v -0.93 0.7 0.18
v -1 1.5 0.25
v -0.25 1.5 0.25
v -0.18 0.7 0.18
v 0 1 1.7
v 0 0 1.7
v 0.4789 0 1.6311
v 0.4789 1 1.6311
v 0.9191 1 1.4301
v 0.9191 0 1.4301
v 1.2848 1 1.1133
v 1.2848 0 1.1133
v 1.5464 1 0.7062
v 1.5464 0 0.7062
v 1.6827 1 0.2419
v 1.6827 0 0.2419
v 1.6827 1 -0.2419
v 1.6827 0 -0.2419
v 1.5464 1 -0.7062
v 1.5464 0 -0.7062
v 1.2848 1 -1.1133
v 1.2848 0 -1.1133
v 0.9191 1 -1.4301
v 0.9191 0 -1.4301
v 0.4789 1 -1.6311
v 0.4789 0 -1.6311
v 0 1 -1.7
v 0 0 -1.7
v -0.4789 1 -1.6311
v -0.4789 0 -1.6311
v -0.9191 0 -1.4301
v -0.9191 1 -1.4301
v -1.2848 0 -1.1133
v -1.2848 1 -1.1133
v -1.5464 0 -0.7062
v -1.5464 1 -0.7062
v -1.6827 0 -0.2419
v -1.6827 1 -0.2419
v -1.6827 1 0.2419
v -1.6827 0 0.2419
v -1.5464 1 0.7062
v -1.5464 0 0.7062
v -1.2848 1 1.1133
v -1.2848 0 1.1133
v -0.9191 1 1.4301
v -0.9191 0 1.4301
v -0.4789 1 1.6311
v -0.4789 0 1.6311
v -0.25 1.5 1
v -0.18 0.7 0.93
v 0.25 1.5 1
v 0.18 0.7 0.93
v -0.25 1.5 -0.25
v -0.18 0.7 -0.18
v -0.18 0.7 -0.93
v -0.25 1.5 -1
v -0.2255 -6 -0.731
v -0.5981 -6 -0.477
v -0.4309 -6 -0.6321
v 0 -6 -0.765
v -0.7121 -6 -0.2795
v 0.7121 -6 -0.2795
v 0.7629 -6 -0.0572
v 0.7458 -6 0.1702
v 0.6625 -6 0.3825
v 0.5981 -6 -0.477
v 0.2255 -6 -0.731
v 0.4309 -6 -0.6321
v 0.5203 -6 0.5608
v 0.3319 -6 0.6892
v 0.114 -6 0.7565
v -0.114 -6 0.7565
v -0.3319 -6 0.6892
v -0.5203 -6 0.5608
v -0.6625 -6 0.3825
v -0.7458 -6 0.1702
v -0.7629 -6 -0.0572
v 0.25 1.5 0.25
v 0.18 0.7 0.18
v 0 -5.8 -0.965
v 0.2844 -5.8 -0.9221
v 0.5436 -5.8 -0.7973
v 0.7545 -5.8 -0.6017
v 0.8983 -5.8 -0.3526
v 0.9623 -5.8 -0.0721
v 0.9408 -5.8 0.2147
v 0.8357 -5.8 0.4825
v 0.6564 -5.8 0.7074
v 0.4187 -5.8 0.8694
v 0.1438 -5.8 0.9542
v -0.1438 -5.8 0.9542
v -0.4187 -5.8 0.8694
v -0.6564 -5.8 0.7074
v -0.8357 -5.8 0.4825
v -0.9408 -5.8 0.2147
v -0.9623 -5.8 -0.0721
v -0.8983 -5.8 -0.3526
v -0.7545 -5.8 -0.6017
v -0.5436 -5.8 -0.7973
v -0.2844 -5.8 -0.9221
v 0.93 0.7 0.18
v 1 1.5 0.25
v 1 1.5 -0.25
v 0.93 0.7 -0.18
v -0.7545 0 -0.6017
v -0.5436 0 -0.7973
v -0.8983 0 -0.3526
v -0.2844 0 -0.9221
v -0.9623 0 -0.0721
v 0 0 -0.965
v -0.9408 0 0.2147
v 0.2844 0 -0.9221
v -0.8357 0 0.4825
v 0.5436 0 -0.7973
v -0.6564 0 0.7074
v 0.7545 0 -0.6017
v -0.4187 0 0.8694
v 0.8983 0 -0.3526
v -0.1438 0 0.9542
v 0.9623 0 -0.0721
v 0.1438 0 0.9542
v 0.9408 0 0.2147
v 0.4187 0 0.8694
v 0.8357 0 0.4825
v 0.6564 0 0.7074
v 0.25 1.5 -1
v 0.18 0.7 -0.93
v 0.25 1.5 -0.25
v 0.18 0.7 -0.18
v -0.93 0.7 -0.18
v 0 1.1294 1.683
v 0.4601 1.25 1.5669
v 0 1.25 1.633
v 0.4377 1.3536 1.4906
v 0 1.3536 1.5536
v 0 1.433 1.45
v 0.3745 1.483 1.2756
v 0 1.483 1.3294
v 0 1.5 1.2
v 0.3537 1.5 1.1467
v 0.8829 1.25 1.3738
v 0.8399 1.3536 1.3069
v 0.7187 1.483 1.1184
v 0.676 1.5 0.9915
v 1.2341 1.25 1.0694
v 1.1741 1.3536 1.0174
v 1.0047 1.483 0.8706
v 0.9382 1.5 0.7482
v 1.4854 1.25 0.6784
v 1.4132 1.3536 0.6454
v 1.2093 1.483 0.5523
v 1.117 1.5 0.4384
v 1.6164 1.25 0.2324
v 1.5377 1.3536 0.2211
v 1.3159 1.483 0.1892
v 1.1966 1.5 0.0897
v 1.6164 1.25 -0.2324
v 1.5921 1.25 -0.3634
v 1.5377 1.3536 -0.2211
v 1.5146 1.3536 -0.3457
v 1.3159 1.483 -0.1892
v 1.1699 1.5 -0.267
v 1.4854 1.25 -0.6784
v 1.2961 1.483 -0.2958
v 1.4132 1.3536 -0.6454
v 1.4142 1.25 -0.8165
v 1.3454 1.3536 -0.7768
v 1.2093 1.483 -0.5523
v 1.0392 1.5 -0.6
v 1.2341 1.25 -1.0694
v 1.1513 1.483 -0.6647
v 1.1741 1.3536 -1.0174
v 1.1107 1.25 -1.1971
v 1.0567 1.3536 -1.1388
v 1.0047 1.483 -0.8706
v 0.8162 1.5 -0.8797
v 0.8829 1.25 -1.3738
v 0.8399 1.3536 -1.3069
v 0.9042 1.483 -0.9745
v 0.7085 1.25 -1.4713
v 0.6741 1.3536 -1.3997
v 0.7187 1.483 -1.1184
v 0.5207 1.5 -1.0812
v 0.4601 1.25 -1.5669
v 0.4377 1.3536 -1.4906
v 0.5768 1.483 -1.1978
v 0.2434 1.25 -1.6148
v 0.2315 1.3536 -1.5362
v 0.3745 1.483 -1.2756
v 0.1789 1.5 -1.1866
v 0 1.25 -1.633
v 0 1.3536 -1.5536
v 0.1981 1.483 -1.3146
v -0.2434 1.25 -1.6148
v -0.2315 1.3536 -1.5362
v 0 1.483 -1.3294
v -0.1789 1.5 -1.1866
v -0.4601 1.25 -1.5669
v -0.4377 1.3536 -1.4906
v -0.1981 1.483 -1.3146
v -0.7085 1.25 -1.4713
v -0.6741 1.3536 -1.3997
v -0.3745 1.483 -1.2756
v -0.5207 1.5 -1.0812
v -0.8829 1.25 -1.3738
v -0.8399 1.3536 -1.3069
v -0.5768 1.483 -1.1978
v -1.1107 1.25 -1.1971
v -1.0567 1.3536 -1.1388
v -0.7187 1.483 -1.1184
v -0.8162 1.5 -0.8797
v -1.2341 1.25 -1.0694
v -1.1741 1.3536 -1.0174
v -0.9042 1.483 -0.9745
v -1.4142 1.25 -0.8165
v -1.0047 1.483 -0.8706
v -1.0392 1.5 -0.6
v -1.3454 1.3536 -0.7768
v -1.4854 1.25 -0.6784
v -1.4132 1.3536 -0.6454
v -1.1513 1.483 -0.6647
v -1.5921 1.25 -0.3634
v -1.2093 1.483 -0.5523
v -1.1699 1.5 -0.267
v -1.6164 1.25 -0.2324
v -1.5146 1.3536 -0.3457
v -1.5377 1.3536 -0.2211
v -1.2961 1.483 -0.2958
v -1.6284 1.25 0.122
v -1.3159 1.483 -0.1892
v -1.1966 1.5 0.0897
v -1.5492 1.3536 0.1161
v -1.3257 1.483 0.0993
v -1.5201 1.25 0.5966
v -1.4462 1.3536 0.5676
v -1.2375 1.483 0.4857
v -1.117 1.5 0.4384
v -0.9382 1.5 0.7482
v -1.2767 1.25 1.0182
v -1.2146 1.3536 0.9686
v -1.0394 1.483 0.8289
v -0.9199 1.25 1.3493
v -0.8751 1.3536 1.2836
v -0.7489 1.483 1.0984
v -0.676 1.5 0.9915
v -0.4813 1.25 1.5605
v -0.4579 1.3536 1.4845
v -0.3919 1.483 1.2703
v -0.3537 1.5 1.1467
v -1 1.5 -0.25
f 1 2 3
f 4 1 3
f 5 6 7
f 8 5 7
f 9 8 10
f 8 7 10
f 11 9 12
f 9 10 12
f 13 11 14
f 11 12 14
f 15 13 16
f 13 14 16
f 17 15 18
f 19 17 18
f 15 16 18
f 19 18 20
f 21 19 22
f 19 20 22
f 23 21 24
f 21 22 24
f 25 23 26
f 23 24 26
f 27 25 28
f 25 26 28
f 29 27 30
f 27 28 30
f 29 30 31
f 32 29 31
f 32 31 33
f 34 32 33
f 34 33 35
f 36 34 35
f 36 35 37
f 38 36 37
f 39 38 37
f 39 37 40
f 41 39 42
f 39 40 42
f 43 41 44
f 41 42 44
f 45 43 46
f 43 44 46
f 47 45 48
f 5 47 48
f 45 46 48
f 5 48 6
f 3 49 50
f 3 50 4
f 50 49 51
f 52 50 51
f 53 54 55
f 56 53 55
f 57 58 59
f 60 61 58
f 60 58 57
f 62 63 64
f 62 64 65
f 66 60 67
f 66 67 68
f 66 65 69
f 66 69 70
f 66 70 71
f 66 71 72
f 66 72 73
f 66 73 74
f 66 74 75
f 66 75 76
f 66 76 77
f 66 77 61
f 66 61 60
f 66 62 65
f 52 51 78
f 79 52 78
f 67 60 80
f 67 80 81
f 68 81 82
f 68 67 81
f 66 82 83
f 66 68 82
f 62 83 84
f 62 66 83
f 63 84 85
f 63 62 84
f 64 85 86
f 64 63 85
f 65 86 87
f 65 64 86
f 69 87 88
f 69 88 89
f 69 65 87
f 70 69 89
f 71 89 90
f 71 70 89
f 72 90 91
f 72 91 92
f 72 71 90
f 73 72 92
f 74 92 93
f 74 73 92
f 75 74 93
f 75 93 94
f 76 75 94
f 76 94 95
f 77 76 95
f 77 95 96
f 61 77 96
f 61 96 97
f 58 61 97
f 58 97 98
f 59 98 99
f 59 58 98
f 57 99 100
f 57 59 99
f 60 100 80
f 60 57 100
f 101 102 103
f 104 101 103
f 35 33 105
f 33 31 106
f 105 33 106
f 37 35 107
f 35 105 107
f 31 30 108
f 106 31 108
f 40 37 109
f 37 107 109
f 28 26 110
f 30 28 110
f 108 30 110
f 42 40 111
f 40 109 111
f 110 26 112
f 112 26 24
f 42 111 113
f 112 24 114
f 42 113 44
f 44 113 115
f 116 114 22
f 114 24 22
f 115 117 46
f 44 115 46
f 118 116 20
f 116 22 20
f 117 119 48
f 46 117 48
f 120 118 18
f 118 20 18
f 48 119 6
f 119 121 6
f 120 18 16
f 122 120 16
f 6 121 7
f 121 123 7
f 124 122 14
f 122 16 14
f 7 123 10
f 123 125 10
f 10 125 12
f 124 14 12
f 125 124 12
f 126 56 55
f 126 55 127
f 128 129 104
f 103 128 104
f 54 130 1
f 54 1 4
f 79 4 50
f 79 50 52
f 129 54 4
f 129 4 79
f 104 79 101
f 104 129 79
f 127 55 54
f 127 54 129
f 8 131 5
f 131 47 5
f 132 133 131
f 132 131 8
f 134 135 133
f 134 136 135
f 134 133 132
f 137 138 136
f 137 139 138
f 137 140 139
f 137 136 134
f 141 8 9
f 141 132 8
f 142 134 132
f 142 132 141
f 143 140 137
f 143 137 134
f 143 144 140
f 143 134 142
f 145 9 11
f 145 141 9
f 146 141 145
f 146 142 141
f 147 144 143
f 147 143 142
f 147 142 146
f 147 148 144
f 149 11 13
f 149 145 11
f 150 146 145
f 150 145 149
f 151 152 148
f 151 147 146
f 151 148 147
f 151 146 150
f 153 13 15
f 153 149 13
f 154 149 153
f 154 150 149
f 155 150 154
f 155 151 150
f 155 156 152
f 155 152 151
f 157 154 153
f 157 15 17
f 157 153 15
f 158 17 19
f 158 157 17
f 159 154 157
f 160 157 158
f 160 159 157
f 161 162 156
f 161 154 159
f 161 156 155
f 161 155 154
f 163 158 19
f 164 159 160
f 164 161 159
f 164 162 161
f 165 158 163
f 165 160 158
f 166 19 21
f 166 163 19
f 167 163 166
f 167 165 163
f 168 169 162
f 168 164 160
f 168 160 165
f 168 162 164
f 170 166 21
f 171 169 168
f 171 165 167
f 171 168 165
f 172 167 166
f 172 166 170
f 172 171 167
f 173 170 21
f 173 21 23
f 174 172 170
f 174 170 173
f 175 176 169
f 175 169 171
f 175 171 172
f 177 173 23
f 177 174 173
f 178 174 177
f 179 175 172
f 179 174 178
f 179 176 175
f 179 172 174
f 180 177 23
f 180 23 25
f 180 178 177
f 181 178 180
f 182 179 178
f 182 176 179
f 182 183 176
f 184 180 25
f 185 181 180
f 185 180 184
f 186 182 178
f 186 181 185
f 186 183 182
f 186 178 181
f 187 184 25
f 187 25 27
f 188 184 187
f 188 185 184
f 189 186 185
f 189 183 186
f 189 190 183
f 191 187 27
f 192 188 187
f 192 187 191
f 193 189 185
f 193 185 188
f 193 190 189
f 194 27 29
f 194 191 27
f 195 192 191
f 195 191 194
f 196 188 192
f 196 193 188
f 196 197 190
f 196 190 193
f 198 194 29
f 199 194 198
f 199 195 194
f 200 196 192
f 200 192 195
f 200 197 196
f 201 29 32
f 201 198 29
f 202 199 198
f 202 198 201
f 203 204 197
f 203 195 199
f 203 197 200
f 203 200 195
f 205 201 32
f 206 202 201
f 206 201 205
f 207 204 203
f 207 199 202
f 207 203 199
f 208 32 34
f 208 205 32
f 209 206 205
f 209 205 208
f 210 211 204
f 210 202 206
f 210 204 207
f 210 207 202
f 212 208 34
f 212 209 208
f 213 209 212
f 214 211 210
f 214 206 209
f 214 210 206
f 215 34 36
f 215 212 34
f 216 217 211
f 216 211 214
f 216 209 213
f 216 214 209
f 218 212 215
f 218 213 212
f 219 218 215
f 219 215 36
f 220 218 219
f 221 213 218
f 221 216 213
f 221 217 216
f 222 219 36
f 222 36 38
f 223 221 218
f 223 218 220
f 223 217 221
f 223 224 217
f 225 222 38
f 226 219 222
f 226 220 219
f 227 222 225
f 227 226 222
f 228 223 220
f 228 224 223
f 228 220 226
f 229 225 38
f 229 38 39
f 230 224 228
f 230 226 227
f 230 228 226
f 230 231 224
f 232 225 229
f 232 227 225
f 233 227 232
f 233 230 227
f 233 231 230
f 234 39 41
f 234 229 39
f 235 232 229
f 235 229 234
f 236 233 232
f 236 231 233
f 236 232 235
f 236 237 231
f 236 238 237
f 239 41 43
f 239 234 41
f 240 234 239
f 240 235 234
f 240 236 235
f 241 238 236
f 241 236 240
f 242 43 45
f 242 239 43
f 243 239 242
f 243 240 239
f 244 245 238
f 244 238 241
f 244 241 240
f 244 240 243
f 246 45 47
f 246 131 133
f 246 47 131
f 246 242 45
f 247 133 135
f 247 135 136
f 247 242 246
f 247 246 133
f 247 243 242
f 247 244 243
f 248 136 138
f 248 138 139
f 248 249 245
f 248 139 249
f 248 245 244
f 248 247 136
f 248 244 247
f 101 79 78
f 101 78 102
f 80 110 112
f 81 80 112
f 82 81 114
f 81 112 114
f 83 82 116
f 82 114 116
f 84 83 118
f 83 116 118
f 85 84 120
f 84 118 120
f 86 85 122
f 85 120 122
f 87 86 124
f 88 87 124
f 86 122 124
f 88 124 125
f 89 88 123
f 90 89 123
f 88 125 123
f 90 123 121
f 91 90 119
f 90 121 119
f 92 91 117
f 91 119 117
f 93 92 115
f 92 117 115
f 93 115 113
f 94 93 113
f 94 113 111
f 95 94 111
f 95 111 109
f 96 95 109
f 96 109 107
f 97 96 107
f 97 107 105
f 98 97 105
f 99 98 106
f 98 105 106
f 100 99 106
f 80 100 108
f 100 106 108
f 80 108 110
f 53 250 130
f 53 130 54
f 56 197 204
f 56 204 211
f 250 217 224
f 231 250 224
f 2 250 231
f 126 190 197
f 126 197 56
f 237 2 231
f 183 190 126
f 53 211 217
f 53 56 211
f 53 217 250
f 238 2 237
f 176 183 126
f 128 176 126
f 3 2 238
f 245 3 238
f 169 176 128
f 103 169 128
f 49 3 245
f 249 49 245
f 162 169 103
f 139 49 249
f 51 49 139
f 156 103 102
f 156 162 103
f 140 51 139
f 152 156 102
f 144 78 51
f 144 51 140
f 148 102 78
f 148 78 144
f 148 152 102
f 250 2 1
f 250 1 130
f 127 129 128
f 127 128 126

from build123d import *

# Parameters (mm, degrees)
SKETCH1_R                         = 1.7
BOSS_EXTRUDE1_DEPTH               = 1.5
SKETCH2_R                         = 0.965
BOSS_EXTRUDE2_DEPTH               = 6
CHAMFER1_SIZE                     = 0.2
SKETCH3_W                         = 0.5
SKETCH3_H                         = 2
CUT_EXTRUDE_THIN1_DEPTH           = 0.8
CUT_EXTRUDE_THIN1_DRAFT           = -5
SKETCH3_W_2                       = 2
SKETCH3_H_2                       = 0.5
CUT_EXTRUDE_THIN1_PROFILE_2_DEPTH = 0.8
CUT_EXTRUDE_THIN1_PROFILE_2_DRAFT = -5
FILLET1_R                         = 0.5


with BuildPart() as part:
    # Sketch1 → Boss-Extrude1 (new body)
    with BuildSketch(Plane(origin=(0, 0, 0), x_dir=(1, 0, 0), z_dir=(0, 1, 0))):
        Circle(SKETCH1_R)
    extrude(amount=BOSS_EXTRUDE1_DEPTH)

    # Sketch2 → Boss-Extrude2 (add)
    with BuildSketch(Plane.XZ):
        Circle(SKETCH2_R)
    extrude(amount=BOSS_EXTRUDE2_DEPTH)

    # Chamfer1
    chamfer1_edges = [part.edges().sort_by_distance(p)[0] for p in [
        (-0.965, -6, 0),
    ]]
    chamfer(chamfer1_edges, length=CHAMFER1_SIZE)


with BuildPart() as cut_extrude_thin1_tool:
    # Sketch3 → Cut-Extrude-Thin1 (with draft: the straight prism first)
    with BuildSketch(Plane(origin=(0, 1.5, 0), x_dir=(1, 0, 0), z_dir=(0, 1, 0))):
        Rectangle(SKETCH3_W, SKETCH3_H)
    extrude(amount=-CUT_EXTRUDE_THIN1_DEPTH)
    # Cut-Extrude-Thin1: the draft: its side faces are tilted about the plane it starts from
    cut_extrude_thin1_sides = [cut_extrude_thin1_tool.faces().sort_by_distance(p)[0] for p in [
        (0.25, 1.1, 0),
        (0, 1.1, -1),
        (-0.25, 1.1, 0),
        (0, 1.1, 1),
    ]]
    draft(cut_extrude_thin1_sides, Plane(origin=(0, 1.5, 0), x_dir=(1, 0, 0), z_dir=(0, 1, 0)), CUT_EXTRUDE_THIN1_DRAFT)


with BuildPart() as part_1:
    add(part.part)

    # Cut-Extrude-Thin1: cut by cut_extrude_thin1_tool
    add(cut_extrude_thin1_tool.part, mode=Mode.SUBTRACT)


with BuildPart() as cut_extrude_thin1_profile_2_tool:
    # Sketch3 → Cut-Extrude-Thin1 profile 2 (with draft: the straight prism first)
    with BuildSketch(Plane(origin=(0, 1.5, 0), x_dir=(1, 0, 0), z_dir=(0, 1, 0))):
        Rectangle(SKETCH3_W_2, SKETCH3_H_2)
    extrude(amount=-CUT_EXTRUDE_THIN1_PROFILE_2_DEPTH)
    # Cut-Extrude-Thin1 profile 2: the draft: its side faces are tilted about the plane it starts from
    cut_extrude_thin1_profile_2_sides = [cut_extrude_thin1_profile_2_tool.faces().sort_by_distance(p)[0] for p in [
        (0, 1.1, 0.25),
        (1, 1.1, 0),
        (0, 1.1, -0.25),
        (-1, 1.1, 0),
    ]]
    draft(cut_extrude_thin1_profile_2_sides, Plane(origin=(0, 1.5, 0), x_dir=(1, 0, 0), z_dir=(0, 1, 0)), CUT_EXTRUDE_THIN1_PROFILE_2_DRAFT)


with BuildPart() as part_2:
    add(part_1.part)

    # Cut-Extrude-Thin1 profile 2: cut by cut_extrude_thin1_profile_2_tool
    add(cut_extrude_thin1_profile_2_tool.part, mode=Mode.SUBTRACT)

    # Fillet1
    fillet1_edges = [part_2.edges().sort_by_distance(p)[0] for p in [
        (-1.7, 1.5, 0),
    ]]
    fillet(fillet1_edges, radius=FILLET1_R)


solid = part_2.part
